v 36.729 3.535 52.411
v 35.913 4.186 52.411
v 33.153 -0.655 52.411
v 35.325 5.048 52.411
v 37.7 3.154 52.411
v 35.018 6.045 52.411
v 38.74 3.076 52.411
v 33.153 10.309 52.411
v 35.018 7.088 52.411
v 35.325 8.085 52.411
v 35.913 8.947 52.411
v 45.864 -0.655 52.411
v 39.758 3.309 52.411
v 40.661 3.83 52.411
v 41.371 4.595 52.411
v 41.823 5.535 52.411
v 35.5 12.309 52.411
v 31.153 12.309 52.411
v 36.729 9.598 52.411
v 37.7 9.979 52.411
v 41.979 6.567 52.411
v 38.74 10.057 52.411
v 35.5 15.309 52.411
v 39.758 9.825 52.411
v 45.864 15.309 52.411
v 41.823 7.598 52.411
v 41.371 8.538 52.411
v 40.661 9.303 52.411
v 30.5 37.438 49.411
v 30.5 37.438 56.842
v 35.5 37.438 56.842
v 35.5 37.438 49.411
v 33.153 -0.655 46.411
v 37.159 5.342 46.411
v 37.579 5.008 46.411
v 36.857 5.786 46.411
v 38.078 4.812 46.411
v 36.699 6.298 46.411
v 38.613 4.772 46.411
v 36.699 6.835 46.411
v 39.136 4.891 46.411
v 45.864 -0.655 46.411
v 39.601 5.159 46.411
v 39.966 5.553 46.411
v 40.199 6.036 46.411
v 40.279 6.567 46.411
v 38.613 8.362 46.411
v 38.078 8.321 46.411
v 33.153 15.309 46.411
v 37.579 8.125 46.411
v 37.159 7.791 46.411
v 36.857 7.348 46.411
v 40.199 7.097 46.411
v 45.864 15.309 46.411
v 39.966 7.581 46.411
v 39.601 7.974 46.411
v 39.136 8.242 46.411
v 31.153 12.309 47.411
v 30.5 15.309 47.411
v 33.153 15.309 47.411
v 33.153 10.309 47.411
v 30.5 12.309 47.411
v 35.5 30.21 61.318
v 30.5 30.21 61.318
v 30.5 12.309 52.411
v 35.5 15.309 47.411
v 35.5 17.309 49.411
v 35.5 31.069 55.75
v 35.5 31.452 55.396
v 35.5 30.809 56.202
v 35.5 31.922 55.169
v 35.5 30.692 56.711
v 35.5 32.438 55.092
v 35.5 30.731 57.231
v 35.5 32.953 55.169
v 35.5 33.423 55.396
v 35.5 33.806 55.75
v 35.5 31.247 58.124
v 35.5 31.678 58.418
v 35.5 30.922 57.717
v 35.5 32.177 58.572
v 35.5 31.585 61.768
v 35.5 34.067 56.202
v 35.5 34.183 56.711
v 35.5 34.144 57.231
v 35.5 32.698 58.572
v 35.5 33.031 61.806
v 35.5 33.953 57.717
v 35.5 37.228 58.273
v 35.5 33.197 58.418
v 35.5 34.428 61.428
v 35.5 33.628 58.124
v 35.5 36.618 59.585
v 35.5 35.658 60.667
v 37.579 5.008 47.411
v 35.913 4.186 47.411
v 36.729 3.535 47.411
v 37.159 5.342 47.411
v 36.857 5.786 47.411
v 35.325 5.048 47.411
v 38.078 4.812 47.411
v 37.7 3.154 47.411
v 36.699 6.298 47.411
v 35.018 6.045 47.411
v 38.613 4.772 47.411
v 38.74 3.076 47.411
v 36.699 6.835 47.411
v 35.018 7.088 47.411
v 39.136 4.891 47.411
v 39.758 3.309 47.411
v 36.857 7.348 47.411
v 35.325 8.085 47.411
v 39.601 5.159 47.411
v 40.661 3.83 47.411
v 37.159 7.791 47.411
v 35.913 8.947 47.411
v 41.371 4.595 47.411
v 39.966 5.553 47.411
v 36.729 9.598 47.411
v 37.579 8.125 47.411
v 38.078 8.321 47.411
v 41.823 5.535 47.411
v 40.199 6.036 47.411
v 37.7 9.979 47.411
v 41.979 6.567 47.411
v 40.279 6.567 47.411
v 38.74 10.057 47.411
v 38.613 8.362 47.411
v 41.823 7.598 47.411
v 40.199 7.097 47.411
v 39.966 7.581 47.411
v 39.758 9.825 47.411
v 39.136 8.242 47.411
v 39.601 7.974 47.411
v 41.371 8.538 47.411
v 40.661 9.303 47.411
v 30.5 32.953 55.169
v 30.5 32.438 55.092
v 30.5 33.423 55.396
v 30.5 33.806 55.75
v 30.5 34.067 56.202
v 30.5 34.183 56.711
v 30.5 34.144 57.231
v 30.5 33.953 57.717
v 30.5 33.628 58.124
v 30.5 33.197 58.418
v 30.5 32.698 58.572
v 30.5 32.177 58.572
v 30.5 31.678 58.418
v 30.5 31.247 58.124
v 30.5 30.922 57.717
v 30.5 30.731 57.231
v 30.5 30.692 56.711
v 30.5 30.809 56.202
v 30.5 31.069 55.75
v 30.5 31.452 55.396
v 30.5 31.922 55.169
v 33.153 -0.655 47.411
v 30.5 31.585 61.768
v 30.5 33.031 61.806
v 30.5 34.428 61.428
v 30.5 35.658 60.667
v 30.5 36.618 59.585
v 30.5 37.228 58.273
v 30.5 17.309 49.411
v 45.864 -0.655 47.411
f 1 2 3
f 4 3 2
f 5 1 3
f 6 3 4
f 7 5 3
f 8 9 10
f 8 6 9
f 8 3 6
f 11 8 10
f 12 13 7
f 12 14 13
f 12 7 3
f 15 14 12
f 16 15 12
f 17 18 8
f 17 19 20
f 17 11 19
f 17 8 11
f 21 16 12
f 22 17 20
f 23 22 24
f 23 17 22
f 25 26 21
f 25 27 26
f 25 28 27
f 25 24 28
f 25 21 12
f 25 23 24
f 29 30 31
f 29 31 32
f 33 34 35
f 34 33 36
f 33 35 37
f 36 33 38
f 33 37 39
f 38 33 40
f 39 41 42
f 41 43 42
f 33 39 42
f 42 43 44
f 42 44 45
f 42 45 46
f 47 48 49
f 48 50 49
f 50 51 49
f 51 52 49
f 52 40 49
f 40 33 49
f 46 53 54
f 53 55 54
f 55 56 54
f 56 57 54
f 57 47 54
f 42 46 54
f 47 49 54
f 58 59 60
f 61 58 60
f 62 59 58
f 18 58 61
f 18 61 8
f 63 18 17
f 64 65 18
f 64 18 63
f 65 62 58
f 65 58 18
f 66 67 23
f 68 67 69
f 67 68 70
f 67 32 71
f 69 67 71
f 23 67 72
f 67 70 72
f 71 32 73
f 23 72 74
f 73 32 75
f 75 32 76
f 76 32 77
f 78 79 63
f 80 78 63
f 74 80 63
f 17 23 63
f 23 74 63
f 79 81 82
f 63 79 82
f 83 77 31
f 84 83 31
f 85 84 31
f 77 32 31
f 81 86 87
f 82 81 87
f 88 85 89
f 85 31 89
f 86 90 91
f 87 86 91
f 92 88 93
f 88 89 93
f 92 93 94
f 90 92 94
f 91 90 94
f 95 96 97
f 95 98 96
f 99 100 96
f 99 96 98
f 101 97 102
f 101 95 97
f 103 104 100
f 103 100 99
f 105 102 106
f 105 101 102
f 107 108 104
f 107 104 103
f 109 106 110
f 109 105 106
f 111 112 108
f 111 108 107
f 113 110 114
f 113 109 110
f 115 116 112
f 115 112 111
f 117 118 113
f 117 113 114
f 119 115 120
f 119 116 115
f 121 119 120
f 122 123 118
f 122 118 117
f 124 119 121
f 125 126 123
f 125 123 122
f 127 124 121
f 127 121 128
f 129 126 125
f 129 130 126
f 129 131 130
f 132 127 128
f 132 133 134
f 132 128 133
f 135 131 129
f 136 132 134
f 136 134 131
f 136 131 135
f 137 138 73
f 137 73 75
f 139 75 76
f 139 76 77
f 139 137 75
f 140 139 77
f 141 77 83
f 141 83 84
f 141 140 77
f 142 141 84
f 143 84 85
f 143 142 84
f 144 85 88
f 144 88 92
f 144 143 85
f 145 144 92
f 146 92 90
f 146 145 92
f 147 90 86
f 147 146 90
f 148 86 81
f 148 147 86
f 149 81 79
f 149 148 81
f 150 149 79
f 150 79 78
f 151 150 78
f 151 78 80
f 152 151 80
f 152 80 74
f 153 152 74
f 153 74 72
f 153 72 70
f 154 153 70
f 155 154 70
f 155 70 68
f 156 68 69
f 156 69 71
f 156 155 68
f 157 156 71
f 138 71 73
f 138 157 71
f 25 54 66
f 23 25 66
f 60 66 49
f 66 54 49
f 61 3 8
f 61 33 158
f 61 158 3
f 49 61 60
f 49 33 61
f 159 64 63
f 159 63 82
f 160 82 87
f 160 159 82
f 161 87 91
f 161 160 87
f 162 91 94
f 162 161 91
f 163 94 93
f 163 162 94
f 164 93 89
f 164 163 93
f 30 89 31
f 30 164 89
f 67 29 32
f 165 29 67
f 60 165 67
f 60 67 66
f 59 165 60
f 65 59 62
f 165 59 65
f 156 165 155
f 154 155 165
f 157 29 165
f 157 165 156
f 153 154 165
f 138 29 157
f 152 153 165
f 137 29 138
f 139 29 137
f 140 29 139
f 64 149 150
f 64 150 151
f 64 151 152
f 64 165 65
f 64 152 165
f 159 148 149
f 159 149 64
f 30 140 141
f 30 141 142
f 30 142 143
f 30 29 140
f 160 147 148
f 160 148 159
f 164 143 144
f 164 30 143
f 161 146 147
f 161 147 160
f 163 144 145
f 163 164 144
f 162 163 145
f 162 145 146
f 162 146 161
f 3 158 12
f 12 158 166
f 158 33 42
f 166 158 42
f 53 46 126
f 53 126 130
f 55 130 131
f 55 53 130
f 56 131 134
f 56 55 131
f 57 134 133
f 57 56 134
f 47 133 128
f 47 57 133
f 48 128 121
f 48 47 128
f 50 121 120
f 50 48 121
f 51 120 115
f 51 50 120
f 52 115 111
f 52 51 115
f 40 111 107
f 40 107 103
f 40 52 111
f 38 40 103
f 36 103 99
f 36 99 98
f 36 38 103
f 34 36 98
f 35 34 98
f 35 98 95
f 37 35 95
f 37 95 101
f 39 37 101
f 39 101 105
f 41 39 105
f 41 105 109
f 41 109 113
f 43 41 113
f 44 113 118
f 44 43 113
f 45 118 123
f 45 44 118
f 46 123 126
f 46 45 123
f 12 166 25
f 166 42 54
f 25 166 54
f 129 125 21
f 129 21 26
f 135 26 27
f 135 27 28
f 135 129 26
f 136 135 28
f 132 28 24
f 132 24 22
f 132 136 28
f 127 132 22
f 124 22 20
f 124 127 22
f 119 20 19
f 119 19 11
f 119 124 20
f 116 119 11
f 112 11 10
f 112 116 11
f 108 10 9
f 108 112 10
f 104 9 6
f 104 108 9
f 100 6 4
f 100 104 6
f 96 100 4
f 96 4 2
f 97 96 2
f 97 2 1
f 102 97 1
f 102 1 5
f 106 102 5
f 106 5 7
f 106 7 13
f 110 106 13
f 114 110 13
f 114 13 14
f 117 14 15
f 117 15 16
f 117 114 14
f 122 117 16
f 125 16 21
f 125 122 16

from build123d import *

# Parameters (mm, degrees)
SKETCH1_W           = 12.710924787
SKETCH1_H           = 15.963552005
SKETCH1_R           = 1.8
BOSS_EXTRUDE1_DEPTH = 1
SKETCH2_R           = 1.75
BOSS_EXTRUDE2_DEPTH = 5
SKETCH3_R           = 3.5
BOSS_EXTRUDE3_DEPTH = 5
CHAMFER1_SIZE       = 2


with BuildPart() as part:
    # Sketch1 → Boss-Extrude1 (new body)
    with BuildSketch(Plane.XY.offset(46.41148)):
        with Locations((39.508303211, 7.326783953)):
            Rectangle(SKETCH1_W, SKETCH1_H)
        with Locations((38.478852397, 6.566573863)):
            Circle(SKETCH1_R, mode=Mode.SUBTRACT)
    extrude(amount=BOSS_EXTRUDE1_DEPTH)

    # Sketch2 → Boss-Extrude2 (add)
    with BuildSketch(Plane(origin=(30.5, 0, 0), x_dir=(0, 0, -1), z_dir=(1, 0, 0))):
        with BuildLine():
            Line((-56.841529107, 37.437587441), (-49.41148, 37.437587441))
            Line((-49.41148, 37.437587441), (-49.41148, 17.308559955))
            Line((-49.41148, 17.308559955), (-47.41148, 15.308559955))
            Line((-47.41148, 15.308559955), (-47.41148, 12.308559955))
            Line((-47.41148, 12.308559955), (-52.41148, 12.308559955))
            Line((-52.41148, 12.308559955), (-61.318087937, 30.210387171))
            ThreePointArc((-61.318087937, 30.210387171), (-61.092176196, 35.07045647), (-56.841529107, 37.437587441))
        make_face()
        with Locations((-56.841529107, 32.437587441)):
            Circle(SKETCH2_R, mode=Mode.SUBTRACT)
    extrude(amount=BOSS_EXTRUDE2_DEPTH)

    # Sketch3 → Boss-Extrude3 (add)
    with BuildSketch(Plane.XY.offset(47.41148)):
        Polygon((35.5, 15.308559955), (35.5, 12.308559955), (33.152840817, 12.308559955), (33.152840817, -0.65499205), (45.863765604, -0.65499205), (45.863765604, 15.308559955), align=None)
        with Locations((38.478852397, 6.566573863)):
            Circle(SKETCH3_R, mode=Mode.SUBTRACT)
    extrude(amount=BOSS_EXTRUDE3_DEPTH)

    # Chamfer1
    chamfer1_edges = [part.edges().sort_by_distance(p)[0] for p in [
        (33.152840817, 12.308559955, 49.91148),
    ]]
    chamfer(chamfer1_edges, length=CHAMFER1_SIZE)


solid = part.part
